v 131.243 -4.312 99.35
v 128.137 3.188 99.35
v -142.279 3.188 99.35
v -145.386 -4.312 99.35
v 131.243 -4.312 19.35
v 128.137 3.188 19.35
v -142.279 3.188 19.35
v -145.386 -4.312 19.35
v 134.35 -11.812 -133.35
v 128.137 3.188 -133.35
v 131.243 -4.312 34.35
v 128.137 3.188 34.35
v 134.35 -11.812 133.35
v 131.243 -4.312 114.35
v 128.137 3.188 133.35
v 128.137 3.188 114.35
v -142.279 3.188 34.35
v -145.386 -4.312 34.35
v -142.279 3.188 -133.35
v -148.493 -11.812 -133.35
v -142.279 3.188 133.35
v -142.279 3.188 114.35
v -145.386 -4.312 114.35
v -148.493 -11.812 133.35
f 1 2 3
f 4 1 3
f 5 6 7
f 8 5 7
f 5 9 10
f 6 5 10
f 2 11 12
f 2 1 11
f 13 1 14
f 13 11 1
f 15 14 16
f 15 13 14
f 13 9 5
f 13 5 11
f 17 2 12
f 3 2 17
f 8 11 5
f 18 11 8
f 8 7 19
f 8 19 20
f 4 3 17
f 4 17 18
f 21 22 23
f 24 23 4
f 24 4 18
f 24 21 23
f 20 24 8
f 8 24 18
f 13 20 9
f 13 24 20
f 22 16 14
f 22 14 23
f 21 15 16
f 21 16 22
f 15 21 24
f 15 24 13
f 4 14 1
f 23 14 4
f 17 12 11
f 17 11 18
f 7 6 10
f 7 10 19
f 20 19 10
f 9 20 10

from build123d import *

# Parameters (mm, degrees)
F1_DEPTH = 133.35
F2_W     = 556
F2_H     = 15
F3_DEPTH = 7.5


with BuildPart() as f1:
    # F0 (on Top) → F1 (new body, symmetric)
    with BuildSketch(Plane.XY):
        Polygon((-142.2794159597, -11.8120698132), (128.1365840403, -11.8120698132), (134.3497874759, -11.8120698132), (128.1365840403, 3.1879301868), (108.9945, 3.1879301868), (-30.4355215827, 3.1879301868), (-35.2318651079, 3.1879301868), (-123.1373319193, 3.1879301868), (-142.2794159597, 3.1879301868), (-148.4926193953, -11.8120698132), align=None)
    extrude(amount=F1_DEPTH, both=True)

    # F2 (on face) → F3 (cut)
    with BuildSketch(Plane(origin=(0, 3.1879301868, 0), x_dir=(-1, 0, 0), z_dir=(0, 1, 0))):
        with Locations((5, 26.85)):
            Rectangle(F2_W, F2_H)
        with Locations((5, 106.85)):
            Rectangle(F2_W, F2_H)
    extrude(amount=-F3_DEPTH, mode=Mode.SUBTRACT)


solid = f1.part
